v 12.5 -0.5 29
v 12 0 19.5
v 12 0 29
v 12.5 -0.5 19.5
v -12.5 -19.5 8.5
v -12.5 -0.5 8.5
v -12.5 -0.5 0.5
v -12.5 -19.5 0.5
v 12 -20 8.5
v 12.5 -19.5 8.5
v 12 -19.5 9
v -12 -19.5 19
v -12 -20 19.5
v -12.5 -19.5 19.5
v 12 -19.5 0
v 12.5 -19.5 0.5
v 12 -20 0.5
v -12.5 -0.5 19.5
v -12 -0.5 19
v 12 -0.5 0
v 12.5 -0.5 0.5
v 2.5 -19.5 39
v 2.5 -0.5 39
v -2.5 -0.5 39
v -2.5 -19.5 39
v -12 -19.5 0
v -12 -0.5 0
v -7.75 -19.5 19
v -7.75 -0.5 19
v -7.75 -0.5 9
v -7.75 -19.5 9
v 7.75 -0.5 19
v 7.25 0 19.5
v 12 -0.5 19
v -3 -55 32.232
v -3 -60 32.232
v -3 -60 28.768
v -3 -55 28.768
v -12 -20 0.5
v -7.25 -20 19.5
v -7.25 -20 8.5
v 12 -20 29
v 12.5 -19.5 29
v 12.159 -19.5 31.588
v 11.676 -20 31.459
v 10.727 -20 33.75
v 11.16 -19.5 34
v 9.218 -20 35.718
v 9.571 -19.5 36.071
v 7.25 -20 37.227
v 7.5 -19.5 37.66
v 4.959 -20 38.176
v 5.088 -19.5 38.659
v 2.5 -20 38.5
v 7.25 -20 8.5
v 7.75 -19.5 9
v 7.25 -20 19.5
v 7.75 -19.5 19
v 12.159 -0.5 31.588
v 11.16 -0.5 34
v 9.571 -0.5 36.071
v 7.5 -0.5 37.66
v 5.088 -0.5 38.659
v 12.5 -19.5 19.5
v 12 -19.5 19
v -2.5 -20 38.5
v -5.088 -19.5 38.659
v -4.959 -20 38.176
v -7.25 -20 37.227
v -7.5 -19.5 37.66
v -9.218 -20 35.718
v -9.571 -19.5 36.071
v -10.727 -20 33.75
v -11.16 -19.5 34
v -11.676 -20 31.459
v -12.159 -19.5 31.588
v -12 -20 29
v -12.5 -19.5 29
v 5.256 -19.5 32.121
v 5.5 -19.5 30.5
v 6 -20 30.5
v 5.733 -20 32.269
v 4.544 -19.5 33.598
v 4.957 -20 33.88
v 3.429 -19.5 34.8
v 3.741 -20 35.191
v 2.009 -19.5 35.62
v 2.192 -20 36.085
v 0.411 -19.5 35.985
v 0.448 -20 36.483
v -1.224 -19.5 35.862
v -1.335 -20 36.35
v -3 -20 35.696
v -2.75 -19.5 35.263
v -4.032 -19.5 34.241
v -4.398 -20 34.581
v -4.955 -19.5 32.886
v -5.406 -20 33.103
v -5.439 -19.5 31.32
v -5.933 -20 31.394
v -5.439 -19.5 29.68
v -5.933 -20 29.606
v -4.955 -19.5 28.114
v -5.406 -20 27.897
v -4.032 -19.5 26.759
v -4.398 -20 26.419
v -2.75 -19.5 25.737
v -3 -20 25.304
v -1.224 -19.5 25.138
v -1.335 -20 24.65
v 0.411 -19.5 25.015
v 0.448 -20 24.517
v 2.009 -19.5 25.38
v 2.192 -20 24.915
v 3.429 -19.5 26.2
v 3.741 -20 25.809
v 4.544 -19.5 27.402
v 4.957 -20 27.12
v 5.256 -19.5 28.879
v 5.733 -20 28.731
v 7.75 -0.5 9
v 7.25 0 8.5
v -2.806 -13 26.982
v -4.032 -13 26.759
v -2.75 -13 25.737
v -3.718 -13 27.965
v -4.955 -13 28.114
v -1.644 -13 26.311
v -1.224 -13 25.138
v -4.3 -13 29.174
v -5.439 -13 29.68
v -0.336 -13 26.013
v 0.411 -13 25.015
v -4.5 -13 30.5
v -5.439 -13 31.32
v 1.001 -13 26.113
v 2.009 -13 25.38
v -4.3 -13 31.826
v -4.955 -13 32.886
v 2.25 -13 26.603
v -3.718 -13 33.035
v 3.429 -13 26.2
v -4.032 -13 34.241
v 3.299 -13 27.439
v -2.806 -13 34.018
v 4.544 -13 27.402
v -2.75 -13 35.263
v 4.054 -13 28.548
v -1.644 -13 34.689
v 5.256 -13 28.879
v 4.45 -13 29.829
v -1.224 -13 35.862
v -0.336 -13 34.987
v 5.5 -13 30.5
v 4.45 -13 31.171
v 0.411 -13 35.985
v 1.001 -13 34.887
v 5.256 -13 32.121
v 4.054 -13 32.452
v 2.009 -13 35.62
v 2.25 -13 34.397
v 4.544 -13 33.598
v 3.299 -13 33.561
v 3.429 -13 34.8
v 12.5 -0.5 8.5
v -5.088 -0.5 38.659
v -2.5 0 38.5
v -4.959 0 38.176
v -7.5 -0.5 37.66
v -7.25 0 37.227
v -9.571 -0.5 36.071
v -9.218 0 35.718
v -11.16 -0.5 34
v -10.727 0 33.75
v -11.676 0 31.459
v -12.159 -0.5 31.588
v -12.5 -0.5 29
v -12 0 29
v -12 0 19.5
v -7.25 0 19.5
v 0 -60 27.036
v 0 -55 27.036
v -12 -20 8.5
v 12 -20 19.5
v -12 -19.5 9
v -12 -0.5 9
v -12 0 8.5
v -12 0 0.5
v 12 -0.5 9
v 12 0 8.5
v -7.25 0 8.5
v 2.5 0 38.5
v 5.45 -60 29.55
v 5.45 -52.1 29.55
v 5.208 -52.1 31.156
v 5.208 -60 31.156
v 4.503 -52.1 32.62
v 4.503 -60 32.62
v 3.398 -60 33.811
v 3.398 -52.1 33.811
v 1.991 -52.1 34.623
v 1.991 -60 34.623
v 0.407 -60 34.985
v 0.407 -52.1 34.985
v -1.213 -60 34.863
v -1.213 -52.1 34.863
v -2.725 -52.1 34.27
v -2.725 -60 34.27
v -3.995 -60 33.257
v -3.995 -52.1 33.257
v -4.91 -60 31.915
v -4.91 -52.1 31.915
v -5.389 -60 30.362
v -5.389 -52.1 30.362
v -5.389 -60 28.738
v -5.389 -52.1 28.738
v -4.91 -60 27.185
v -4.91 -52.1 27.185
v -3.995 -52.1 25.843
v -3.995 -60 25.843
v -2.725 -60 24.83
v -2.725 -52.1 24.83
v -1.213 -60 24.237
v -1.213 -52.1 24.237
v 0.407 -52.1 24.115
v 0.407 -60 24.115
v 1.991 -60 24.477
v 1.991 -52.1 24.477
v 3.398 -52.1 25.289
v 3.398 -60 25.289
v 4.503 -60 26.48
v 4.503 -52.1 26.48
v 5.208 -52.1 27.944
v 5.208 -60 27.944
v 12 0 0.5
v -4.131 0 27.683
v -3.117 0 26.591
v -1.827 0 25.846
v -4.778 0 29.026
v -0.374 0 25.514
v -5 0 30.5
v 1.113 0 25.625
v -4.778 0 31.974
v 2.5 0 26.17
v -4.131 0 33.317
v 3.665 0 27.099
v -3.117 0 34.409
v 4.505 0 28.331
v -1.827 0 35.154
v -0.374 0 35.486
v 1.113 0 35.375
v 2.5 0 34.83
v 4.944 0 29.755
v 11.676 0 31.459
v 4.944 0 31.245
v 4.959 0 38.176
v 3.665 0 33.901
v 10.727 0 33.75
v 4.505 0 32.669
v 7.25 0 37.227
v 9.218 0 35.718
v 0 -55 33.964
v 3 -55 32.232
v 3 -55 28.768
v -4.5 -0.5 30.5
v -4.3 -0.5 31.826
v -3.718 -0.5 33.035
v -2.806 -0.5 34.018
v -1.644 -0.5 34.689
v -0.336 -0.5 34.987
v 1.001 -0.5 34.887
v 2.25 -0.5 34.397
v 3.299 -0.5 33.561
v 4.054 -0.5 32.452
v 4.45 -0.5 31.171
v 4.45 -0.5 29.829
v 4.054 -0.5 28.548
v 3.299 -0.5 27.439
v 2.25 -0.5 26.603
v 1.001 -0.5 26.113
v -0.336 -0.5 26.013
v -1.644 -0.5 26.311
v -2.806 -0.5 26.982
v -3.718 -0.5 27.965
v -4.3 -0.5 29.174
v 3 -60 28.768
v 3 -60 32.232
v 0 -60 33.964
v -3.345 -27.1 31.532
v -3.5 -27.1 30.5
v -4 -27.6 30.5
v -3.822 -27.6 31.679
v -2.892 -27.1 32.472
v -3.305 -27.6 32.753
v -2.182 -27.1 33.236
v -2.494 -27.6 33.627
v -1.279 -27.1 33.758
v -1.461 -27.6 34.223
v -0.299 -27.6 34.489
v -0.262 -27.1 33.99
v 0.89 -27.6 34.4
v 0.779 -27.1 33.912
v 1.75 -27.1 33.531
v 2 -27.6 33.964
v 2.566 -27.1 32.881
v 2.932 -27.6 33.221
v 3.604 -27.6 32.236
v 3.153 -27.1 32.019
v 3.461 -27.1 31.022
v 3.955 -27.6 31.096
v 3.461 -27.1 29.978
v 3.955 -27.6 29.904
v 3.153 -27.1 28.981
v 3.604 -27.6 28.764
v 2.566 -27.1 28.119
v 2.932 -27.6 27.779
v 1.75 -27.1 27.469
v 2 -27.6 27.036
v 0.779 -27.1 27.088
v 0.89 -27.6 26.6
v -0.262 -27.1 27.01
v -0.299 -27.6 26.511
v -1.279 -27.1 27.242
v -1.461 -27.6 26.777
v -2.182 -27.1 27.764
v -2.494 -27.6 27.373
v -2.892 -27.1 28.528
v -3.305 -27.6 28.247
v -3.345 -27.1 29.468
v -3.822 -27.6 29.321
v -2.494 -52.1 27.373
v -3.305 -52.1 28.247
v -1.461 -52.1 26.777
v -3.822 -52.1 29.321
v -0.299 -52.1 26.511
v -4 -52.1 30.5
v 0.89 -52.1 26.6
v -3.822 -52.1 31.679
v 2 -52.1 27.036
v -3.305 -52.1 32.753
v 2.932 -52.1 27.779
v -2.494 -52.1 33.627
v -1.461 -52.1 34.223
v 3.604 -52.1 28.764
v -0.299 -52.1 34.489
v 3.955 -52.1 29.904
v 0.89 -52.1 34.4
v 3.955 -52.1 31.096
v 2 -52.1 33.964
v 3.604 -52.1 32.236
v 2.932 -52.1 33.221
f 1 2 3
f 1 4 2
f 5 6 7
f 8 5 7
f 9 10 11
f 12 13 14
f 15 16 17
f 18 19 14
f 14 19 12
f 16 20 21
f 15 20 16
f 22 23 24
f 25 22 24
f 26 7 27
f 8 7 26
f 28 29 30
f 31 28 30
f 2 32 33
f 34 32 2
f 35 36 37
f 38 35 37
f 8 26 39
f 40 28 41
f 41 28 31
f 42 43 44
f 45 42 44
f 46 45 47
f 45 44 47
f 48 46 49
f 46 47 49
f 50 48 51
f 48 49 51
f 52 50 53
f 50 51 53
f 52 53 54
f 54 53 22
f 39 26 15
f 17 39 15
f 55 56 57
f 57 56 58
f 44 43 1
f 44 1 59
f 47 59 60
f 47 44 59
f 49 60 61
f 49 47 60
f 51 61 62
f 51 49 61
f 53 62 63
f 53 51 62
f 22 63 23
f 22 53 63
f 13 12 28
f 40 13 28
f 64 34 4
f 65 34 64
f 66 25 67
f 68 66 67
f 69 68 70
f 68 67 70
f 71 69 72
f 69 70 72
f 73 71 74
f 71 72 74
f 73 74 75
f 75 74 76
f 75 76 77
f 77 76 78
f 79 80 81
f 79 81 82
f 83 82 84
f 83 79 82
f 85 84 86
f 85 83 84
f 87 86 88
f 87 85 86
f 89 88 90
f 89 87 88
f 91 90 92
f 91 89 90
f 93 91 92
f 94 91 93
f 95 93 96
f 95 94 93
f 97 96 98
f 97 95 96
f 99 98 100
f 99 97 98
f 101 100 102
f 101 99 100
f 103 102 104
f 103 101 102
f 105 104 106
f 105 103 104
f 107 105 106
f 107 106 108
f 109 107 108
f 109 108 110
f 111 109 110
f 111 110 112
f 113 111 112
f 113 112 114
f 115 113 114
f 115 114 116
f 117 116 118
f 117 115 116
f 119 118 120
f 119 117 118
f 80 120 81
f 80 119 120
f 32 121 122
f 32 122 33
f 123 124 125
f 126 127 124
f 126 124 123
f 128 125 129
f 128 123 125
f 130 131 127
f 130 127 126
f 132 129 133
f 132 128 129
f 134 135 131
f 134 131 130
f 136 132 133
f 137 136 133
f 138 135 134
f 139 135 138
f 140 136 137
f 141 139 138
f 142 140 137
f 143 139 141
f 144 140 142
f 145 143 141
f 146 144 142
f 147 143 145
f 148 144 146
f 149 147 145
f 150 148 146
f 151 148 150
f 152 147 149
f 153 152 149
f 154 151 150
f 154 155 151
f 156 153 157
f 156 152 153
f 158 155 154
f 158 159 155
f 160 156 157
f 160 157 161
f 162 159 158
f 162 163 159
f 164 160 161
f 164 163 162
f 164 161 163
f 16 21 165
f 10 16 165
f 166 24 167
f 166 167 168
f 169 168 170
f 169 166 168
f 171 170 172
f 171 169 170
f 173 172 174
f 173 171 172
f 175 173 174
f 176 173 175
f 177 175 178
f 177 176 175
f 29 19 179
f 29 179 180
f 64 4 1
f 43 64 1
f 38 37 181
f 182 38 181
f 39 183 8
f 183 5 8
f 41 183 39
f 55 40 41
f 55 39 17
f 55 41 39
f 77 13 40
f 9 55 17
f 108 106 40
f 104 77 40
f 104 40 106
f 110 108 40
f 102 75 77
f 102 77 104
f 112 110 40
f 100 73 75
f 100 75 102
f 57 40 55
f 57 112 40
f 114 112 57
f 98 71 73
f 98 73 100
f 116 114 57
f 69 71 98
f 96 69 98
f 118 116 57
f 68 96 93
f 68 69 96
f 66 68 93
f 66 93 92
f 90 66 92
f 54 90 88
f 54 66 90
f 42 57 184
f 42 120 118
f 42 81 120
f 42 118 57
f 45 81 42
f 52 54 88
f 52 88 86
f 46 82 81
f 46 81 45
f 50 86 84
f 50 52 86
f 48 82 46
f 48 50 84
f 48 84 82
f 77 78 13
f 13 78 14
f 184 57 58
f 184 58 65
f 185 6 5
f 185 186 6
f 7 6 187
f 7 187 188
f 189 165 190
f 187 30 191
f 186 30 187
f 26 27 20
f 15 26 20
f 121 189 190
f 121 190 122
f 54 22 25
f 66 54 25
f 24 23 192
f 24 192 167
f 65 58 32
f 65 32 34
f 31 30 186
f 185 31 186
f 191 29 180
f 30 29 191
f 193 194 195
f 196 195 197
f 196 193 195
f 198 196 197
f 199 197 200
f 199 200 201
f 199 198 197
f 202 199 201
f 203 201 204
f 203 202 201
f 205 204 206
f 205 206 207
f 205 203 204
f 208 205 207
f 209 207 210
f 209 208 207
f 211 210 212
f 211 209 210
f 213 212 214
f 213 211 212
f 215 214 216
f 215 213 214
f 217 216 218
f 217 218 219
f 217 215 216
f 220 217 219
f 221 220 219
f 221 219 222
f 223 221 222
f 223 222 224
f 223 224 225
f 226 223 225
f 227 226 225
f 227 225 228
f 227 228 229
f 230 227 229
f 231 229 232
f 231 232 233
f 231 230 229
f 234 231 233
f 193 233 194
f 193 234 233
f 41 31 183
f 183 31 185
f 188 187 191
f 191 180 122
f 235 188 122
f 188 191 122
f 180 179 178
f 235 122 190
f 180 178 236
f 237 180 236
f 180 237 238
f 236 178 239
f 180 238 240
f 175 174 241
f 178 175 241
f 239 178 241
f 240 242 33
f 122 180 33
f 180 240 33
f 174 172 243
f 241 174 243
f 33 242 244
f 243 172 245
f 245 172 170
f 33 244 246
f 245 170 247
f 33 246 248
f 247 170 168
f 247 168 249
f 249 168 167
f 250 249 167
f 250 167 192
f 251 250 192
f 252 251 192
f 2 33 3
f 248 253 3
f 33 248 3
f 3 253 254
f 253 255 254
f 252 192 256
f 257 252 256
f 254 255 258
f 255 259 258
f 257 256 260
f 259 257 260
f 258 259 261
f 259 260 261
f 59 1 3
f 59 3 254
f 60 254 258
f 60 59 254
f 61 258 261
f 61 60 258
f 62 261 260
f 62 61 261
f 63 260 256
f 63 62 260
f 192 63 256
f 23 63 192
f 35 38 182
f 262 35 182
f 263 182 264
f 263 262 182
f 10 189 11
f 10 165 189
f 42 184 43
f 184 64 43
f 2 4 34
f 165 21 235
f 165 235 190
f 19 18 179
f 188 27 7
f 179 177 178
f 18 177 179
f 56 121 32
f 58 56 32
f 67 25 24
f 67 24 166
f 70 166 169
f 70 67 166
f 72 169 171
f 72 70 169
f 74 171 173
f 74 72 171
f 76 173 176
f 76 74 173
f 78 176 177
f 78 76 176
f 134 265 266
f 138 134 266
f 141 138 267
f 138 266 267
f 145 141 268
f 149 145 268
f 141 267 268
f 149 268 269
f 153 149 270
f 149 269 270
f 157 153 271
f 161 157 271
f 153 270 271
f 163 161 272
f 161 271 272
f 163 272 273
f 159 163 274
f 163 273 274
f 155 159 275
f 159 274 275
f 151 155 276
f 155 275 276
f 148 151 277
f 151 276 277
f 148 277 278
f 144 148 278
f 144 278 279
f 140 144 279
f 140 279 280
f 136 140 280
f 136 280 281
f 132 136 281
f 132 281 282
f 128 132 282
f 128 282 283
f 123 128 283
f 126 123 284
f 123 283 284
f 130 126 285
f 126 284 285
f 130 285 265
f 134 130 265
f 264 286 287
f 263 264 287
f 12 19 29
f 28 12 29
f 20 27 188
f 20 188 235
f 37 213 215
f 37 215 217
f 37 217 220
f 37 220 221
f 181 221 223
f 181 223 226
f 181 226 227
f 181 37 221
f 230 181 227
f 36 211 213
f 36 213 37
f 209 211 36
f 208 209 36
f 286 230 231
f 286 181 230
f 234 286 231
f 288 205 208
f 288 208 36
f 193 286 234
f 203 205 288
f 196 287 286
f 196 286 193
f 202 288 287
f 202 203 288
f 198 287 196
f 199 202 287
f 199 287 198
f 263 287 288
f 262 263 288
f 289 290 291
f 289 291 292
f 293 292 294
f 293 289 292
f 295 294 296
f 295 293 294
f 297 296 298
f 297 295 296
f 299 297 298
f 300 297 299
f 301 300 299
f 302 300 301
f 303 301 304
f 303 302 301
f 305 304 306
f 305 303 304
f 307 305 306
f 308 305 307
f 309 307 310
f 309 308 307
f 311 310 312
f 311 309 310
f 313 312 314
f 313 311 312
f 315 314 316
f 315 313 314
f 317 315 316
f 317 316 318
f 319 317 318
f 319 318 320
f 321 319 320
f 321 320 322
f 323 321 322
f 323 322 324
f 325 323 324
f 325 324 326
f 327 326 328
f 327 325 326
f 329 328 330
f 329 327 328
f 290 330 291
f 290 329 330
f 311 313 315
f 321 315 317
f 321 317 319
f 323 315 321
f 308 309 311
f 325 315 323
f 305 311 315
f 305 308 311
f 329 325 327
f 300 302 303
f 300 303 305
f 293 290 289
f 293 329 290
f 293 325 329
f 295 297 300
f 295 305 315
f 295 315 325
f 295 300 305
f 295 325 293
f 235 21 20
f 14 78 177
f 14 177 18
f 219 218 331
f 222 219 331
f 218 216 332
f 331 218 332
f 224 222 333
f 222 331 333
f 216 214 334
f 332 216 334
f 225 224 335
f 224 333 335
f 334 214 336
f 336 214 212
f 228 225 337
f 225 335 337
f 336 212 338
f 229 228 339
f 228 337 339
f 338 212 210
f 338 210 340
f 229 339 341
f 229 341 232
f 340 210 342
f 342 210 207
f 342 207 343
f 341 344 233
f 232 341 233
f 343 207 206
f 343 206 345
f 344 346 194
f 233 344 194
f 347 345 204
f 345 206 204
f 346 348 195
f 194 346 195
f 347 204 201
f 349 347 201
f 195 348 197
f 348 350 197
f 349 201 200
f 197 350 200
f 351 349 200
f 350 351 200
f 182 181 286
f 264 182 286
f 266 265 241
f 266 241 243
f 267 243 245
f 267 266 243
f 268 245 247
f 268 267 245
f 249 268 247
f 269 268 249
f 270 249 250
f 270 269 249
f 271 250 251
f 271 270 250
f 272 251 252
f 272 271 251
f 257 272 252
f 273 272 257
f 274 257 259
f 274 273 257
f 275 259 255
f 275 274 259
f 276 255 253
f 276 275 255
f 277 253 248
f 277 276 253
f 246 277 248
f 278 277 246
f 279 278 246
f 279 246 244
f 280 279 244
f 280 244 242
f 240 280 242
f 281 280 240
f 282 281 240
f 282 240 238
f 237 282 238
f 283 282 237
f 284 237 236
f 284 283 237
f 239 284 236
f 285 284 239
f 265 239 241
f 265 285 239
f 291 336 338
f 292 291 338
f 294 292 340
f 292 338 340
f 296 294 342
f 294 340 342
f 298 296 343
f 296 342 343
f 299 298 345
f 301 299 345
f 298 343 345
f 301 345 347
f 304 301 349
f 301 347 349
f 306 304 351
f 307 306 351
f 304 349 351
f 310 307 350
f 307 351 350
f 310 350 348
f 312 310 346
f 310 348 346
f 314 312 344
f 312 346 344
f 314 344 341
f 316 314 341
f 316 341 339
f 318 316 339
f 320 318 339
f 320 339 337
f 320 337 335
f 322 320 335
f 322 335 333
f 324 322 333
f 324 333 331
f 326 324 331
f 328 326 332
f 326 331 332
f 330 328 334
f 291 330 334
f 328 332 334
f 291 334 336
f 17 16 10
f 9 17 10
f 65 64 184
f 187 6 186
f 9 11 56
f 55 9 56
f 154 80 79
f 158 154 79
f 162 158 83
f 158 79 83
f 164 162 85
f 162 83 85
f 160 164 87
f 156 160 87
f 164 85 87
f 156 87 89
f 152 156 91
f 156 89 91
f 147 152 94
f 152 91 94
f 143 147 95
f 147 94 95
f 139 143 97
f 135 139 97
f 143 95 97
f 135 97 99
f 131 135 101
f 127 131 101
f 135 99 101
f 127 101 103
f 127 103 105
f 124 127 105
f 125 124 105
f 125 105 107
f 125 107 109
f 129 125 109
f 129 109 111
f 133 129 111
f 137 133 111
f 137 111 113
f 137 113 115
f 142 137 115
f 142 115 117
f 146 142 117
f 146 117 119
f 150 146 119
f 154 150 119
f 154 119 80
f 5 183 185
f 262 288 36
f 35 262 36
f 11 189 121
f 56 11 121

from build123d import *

# Parameters (mm, degrees)
F1_DEPTH       = 20
F2_R           = 10
F4_D           = 9
F4_CBORE_D     = 11
F4_CBORE_DEPTH = 7
F5_SIZE        = 0.5
F7_R           = 6.45
F8_DEPTH       = 7.9
F10_DEPTH      = 5
F11_R          = 4
F12_DEPTH      = 25
F13_SIZE       = 0.5
F14_R          = 6.45
F14_R_2        = 5.45
F15_DEPTH      = 7.9


with BuildPart() as f1:
    # F0 (on Front) → F1 (new body)
    with BuildSketch(Plane.XZ):
        Polygon((-12.5, 0), (0, 0), (12.5, 0), (12.5, 9), (7.75, 9), (7.75, 19), (12.5, 19), (12.5, 39), (0, 39), (-12.5, 39), (-12.5, 19), (-7.75, 19), (-7.75, 9), (-12.5, 9), align=None)
    extrude(amount=F1_DEPTH)

    # F2
    f2_edges = [f1.edges().sort_by_distance(p)[0] for p in [
        (-12.5, -10, 39),
        (12.5, -10, 39),
    ]]
    fillet(f2_edges, radius=F2_R)

    # F4 (through all)
    with Locations(Plane.XZ.offset(20)):
        with Locations((0, 30.5)):
            CounterBoreHole(F4_D / 2, F4_CBORE_D / 2, F4_CBORE_DEPTH)

    # F5
    f5_edges = [f1.edges().sort_by_distance(p)[0] for p in [
        (0, -20, 39),
        (-2.5, -10, 39),
        (2.5, -10, 39),
        (0, 0, 39),
        (12.5, 0, 24),
        (12.5, -10, 29),
        (12.5, -10, 19),
        (12.5, -20, 24),
        (12.5, -10, 0),
        (12.5, -10, 9),
        (12.5, 0, 4.5),
        (12.5, -20, 4.5),
        (-12.5, -10, 0),
        (0, -20, 0),
        (0, 0, 0),
        (9.571068, -20, 36.071068),
        (10.125, -20, 19),
        (7.75, -20, 14),
        (-9.571068, -20, 36.071068),
        (10.125, -20, 9),
        (-12.5, -20, 24),
        (-10.125, -20, 19),
        (-7.75, -20, 14),
        (-12.5, -20, 4.5),
        (-10.125, -20, 9),
        (-5.5, -20, 30.5),
        (-12.5, -10, 9),
        (-12.5, 0, 4.5),
        (-12.5, 0, 24),
        (-12.5, -10, 29),
        (-12.5, -10, 19),
        (9.571068, 0, 36.071068),
        (10.125, 0, 19),
        (7.75, 0, 14),
        (-9.571068, 0, 36.071068),
        (10.125, 0, 9),
        (-10.125, 0, 19),
        (-7.75, 0, 14),
        (-10.125, 0, 9),
        (-4.5, 0, 30.5),
    ]]
    chamfer(f5_edges, length=F5_SIZE)


with BuildPart() as f8:
    # F7 (on offset) → F8 (new body)
    with BuildSketch(Plane.XZ.offset(60)):
        with Locations((0, 30.5)):
            Circle(F7_R)
    extrude(amount=-F8_DEPTH)

    # F9 (on face) → F10 (cut)
    with BuildSketch(Plane.XZ.offset(60)):
        Polygon((3, 32.2320508076), (0, 33.9641016151), (-3, 32.2320508076), (-3, 28.7679491924), (0, 27.0358983849), (3, 28.7679491924), align=None)
    extrude(amount=-F10_DEPTH, mode=Mode.SUBTRACT)

    # F11 (on face) → F12 (join)
    with BuildSketch(Plane(origin=(0, -52.1, 0), x_dir=(-1, 0, 0), z_dir=(0, 1, 0))):
        with Locations((0, 30.5)):
            Circle(F11_R)
    extrude(amount=F12_DEPTH)

    # F13
    f13_edges = [f8.edges().sort_by_distance(p)[0] for p in [
        (4, -27.1, 30.5),
    ]]
    chamfer(f13_edges, length=F13_SIZE)

    # F14 (on face) → F15 (cut, through all)
    with BuildSketch(Plane.XZ.offset(60)):
        with Locations((0, 30.5)):
            Circle(F14_R)
        with Locations((0, 29.55)):
            Circle(F14_R_2, mode=Mode.SUBTRACT)
    extrude(amount=-F15_DEPTH, mode=Mode.SUBTRACT)


solid = Compound([f1.part, f8.part])
